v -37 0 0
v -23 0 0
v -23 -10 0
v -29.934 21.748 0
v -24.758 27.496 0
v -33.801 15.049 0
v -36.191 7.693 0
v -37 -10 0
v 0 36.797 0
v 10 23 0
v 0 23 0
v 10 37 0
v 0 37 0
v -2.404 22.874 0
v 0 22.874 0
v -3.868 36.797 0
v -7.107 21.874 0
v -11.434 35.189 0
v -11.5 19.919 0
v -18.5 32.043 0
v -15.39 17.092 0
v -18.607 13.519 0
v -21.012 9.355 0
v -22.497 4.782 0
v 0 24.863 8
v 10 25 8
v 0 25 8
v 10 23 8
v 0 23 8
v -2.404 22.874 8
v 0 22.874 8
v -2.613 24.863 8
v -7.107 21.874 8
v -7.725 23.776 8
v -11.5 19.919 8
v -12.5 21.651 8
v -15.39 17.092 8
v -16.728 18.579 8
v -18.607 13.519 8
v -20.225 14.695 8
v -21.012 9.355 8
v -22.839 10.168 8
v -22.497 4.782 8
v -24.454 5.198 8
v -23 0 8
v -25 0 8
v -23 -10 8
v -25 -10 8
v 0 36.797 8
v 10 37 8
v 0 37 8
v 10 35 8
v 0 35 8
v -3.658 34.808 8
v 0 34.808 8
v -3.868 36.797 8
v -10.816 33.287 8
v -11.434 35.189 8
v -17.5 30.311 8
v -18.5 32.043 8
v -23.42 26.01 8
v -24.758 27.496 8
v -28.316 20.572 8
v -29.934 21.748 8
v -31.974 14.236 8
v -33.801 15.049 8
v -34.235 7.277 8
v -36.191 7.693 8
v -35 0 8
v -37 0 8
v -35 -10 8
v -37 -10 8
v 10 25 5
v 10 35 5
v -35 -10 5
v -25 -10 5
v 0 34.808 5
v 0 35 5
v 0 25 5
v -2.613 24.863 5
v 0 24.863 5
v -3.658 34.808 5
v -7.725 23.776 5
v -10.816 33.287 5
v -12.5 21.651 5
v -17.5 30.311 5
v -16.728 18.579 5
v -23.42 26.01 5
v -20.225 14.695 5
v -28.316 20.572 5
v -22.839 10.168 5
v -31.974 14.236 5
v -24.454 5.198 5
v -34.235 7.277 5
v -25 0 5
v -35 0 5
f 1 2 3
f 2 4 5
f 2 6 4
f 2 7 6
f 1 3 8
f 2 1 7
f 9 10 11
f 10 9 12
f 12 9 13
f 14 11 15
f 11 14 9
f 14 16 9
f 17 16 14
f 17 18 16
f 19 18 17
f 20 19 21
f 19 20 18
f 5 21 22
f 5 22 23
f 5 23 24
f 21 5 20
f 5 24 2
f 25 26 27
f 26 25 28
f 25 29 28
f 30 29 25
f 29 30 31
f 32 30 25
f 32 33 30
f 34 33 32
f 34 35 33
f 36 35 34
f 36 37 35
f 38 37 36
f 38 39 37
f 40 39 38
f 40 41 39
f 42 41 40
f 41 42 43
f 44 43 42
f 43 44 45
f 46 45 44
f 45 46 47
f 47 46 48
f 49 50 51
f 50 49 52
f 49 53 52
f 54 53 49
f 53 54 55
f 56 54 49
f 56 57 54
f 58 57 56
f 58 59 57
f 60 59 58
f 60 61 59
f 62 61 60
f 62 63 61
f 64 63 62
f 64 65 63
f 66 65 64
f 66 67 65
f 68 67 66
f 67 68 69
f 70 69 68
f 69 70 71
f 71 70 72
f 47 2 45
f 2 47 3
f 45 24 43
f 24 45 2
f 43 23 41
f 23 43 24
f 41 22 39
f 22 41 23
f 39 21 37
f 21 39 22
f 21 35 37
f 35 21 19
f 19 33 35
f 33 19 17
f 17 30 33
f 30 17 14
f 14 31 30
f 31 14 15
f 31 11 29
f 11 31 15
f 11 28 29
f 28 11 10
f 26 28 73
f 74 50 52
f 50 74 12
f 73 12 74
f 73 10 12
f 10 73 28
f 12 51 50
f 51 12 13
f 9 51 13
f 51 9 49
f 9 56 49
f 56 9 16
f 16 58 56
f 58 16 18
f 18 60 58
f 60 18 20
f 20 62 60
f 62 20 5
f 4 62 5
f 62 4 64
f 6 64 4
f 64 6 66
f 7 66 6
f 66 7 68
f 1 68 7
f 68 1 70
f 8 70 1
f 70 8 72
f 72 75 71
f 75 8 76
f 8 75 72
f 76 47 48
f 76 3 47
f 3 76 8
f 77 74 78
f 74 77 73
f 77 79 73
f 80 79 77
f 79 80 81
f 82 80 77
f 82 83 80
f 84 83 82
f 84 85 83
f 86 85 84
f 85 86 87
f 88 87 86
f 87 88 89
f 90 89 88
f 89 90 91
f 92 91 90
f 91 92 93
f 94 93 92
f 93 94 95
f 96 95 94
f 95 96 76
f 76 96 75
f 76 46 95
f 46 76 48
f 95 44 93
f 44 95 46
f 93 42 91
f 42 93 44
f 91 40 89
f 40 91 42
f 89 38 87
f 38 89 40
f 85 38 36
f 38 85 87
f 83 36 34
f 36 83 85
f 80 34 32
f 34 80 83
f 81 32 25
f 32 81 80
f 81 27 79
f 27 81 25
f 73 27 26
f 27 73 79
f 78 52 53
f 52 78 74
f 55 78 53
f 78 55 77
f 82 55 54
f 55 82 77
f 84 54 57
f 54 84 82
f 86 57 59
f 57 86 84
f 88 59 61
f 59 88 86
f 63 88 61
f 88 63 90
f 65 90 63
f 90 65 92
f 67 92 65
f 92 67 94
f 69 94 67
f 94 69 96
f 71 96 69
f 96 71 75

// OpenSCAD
channel_r_inner = 25;
channel_r_outer = 35;
channel_depth = 3;
lift = 5;
edge_thickness = 2;
run_length = 10;

module template(depth, r_outer, r_inner, run_length) {
    linear_extrude(depth) {
        union() {
            translate([0, r_inner, 0]) {
                square([run_length, r_outer - r_inner]);
            }
            translate([-r_outer, -run_length, 0]) {
                square([r_outer - r_inner, run_length]);
            }
            difference() {
                circle(r_outer);
                circle(r_inner);
                square(r_outer);
                translate([0, -r_outer / 2, 0]) {
                    square([2 * r_outer, r_outer], center=true);
                }
            }
        }
    }
}

module channel() {
    template(
        channel_depth, 
        channel_r_outer, 
        channel_r_inner, 
        run_length
    );
}

module foot() {
    template(
        lift + channel_depth, 
        channel_r_outer + edge_thickness, 
        channel_r_inner - edge_thickness, 
        run_length
    );
}

difference() {
    foot();
    translate([0, 0, lift]) channel();
}
